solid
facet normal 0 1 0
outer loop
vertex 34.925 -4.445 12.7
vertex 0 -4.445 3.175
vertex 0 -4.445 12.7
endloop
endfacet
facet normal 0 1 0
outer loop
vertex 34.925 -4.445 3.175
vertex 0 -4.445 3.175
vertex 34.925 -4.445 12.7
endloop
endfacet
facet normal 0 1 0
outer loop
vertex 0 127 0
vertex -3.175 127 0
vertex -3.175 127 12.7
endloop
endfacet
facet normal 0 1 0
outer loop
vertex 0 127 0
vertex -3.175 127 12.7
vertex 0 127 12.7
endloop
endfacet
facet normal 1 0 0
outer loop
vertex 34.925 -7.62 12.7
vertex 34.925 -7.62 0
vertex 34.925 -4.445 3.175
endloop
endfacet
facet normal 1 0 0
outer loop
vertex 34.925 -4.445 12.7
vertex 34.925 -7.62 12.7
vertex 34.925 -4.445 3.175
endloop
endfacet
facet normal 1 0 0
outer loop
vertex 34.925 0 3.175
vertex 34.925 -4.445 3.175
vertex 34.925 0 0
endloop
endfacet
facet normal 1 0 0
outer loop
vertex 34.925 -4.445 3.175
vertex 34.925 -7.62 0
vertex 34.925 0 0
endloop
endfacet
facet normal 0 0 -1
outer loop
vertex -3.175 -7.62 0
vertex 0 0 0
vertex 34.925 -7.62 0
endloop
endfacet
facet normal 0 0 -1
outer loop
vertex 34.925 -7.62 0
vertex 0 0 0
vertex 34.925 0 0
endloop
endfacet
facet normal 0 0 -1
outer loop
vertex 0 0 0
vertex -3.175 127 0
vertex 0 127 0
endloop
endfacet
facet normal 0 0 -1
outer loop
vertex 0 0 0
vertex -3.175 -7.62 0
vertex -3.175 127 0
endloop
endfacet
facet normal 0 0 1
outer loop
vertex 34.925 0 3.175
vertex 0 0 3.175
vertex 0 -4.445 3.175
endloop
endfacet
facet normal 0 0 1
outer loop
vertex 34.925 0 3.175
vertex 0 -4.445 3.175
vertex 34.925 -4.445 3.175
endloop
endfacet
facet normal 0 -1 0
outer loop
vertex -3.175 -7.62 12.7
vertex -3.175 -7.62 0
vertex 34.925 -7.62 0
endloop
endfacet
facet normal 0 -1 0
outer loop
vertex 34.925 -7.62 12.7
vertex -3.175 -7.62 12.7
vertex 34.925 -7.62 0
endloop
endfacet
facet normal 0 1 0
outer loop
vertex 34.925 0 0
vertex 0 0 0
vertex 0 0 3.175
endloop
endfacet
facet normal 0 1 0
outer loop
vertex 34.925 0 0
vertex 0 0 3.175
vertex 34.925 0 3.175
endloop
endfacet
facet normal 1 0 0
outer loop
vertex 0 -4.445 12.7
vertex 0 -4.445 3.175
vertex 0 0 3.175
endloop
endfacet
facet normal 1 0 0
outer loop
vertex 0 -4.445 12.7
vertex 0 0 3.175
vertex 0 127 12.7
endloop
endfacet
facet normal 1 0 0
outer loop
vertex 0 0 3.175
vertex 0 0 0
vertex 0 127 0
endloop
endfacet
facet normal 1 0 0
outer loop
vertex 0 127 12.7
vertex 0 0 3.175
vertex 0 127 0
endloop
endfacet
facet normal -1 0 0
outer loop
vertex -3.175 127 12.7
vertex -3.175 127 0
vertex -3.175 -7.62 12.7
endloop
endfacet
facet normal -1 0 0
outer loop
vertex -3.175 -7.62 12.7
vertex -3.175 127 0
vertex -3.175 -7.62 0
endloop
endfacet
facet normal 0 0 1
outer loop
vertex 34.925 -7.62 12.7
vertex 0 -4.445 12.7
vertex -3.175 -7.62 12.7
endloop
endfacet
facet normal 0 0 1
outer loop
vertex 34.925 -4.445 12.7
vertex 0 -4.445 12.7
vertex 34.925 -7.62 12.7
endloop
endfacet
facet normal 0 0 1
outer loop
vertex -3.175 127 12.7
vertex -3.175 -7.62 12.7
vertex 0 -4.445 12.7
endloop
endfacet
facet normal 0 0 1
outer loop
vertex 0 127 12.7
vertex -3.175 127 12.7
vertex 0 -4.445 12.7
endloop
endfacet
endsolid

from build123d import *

# Parameters (mm, degrees)
F0_W     = 3.175
F0_H     = 127
F0_H_2   = 4.445
F0_H_3   = 3.175
F0_W_2   = 34.925
F1_DEPTH = 12.7
F2_DEPTH = 3.175


# Not quite as in the source:
# - a length typed as a fraction of an inch, garbled in the dataset ("3 / 203.2 mm" for 3/8 in), is restored


with BuildPart() as f1:
    # F0 (on Top) → F1 (new body)
    with BuildSketch(Plane.XY):
        with Locations((-1.5875, 63.5)):
            Rectangle(F0_W, F0_H)
        with Locations((-1.5875, -2.2225)):
            Rectangle(F0_W, F0_H_2)
        with Locations((-1.5875, -6.0325)):
            Rectangle(F0_W, F0_H_3)
        with Locations((17.4625, -6.0325)):
            Rectangle(F0_W_2, F0_H_3)
    extrude(amount=F1_DEPTH)

    # F0 (on Top) → F2 (join)
    with BuildSketch(Plane.XY):
        with Locations((17.4625, -2.2225)):
            Rectangle(F0_W_2, F0_H_2)
    extrude(amount=F2_DEPTH)


solid = f1.part
